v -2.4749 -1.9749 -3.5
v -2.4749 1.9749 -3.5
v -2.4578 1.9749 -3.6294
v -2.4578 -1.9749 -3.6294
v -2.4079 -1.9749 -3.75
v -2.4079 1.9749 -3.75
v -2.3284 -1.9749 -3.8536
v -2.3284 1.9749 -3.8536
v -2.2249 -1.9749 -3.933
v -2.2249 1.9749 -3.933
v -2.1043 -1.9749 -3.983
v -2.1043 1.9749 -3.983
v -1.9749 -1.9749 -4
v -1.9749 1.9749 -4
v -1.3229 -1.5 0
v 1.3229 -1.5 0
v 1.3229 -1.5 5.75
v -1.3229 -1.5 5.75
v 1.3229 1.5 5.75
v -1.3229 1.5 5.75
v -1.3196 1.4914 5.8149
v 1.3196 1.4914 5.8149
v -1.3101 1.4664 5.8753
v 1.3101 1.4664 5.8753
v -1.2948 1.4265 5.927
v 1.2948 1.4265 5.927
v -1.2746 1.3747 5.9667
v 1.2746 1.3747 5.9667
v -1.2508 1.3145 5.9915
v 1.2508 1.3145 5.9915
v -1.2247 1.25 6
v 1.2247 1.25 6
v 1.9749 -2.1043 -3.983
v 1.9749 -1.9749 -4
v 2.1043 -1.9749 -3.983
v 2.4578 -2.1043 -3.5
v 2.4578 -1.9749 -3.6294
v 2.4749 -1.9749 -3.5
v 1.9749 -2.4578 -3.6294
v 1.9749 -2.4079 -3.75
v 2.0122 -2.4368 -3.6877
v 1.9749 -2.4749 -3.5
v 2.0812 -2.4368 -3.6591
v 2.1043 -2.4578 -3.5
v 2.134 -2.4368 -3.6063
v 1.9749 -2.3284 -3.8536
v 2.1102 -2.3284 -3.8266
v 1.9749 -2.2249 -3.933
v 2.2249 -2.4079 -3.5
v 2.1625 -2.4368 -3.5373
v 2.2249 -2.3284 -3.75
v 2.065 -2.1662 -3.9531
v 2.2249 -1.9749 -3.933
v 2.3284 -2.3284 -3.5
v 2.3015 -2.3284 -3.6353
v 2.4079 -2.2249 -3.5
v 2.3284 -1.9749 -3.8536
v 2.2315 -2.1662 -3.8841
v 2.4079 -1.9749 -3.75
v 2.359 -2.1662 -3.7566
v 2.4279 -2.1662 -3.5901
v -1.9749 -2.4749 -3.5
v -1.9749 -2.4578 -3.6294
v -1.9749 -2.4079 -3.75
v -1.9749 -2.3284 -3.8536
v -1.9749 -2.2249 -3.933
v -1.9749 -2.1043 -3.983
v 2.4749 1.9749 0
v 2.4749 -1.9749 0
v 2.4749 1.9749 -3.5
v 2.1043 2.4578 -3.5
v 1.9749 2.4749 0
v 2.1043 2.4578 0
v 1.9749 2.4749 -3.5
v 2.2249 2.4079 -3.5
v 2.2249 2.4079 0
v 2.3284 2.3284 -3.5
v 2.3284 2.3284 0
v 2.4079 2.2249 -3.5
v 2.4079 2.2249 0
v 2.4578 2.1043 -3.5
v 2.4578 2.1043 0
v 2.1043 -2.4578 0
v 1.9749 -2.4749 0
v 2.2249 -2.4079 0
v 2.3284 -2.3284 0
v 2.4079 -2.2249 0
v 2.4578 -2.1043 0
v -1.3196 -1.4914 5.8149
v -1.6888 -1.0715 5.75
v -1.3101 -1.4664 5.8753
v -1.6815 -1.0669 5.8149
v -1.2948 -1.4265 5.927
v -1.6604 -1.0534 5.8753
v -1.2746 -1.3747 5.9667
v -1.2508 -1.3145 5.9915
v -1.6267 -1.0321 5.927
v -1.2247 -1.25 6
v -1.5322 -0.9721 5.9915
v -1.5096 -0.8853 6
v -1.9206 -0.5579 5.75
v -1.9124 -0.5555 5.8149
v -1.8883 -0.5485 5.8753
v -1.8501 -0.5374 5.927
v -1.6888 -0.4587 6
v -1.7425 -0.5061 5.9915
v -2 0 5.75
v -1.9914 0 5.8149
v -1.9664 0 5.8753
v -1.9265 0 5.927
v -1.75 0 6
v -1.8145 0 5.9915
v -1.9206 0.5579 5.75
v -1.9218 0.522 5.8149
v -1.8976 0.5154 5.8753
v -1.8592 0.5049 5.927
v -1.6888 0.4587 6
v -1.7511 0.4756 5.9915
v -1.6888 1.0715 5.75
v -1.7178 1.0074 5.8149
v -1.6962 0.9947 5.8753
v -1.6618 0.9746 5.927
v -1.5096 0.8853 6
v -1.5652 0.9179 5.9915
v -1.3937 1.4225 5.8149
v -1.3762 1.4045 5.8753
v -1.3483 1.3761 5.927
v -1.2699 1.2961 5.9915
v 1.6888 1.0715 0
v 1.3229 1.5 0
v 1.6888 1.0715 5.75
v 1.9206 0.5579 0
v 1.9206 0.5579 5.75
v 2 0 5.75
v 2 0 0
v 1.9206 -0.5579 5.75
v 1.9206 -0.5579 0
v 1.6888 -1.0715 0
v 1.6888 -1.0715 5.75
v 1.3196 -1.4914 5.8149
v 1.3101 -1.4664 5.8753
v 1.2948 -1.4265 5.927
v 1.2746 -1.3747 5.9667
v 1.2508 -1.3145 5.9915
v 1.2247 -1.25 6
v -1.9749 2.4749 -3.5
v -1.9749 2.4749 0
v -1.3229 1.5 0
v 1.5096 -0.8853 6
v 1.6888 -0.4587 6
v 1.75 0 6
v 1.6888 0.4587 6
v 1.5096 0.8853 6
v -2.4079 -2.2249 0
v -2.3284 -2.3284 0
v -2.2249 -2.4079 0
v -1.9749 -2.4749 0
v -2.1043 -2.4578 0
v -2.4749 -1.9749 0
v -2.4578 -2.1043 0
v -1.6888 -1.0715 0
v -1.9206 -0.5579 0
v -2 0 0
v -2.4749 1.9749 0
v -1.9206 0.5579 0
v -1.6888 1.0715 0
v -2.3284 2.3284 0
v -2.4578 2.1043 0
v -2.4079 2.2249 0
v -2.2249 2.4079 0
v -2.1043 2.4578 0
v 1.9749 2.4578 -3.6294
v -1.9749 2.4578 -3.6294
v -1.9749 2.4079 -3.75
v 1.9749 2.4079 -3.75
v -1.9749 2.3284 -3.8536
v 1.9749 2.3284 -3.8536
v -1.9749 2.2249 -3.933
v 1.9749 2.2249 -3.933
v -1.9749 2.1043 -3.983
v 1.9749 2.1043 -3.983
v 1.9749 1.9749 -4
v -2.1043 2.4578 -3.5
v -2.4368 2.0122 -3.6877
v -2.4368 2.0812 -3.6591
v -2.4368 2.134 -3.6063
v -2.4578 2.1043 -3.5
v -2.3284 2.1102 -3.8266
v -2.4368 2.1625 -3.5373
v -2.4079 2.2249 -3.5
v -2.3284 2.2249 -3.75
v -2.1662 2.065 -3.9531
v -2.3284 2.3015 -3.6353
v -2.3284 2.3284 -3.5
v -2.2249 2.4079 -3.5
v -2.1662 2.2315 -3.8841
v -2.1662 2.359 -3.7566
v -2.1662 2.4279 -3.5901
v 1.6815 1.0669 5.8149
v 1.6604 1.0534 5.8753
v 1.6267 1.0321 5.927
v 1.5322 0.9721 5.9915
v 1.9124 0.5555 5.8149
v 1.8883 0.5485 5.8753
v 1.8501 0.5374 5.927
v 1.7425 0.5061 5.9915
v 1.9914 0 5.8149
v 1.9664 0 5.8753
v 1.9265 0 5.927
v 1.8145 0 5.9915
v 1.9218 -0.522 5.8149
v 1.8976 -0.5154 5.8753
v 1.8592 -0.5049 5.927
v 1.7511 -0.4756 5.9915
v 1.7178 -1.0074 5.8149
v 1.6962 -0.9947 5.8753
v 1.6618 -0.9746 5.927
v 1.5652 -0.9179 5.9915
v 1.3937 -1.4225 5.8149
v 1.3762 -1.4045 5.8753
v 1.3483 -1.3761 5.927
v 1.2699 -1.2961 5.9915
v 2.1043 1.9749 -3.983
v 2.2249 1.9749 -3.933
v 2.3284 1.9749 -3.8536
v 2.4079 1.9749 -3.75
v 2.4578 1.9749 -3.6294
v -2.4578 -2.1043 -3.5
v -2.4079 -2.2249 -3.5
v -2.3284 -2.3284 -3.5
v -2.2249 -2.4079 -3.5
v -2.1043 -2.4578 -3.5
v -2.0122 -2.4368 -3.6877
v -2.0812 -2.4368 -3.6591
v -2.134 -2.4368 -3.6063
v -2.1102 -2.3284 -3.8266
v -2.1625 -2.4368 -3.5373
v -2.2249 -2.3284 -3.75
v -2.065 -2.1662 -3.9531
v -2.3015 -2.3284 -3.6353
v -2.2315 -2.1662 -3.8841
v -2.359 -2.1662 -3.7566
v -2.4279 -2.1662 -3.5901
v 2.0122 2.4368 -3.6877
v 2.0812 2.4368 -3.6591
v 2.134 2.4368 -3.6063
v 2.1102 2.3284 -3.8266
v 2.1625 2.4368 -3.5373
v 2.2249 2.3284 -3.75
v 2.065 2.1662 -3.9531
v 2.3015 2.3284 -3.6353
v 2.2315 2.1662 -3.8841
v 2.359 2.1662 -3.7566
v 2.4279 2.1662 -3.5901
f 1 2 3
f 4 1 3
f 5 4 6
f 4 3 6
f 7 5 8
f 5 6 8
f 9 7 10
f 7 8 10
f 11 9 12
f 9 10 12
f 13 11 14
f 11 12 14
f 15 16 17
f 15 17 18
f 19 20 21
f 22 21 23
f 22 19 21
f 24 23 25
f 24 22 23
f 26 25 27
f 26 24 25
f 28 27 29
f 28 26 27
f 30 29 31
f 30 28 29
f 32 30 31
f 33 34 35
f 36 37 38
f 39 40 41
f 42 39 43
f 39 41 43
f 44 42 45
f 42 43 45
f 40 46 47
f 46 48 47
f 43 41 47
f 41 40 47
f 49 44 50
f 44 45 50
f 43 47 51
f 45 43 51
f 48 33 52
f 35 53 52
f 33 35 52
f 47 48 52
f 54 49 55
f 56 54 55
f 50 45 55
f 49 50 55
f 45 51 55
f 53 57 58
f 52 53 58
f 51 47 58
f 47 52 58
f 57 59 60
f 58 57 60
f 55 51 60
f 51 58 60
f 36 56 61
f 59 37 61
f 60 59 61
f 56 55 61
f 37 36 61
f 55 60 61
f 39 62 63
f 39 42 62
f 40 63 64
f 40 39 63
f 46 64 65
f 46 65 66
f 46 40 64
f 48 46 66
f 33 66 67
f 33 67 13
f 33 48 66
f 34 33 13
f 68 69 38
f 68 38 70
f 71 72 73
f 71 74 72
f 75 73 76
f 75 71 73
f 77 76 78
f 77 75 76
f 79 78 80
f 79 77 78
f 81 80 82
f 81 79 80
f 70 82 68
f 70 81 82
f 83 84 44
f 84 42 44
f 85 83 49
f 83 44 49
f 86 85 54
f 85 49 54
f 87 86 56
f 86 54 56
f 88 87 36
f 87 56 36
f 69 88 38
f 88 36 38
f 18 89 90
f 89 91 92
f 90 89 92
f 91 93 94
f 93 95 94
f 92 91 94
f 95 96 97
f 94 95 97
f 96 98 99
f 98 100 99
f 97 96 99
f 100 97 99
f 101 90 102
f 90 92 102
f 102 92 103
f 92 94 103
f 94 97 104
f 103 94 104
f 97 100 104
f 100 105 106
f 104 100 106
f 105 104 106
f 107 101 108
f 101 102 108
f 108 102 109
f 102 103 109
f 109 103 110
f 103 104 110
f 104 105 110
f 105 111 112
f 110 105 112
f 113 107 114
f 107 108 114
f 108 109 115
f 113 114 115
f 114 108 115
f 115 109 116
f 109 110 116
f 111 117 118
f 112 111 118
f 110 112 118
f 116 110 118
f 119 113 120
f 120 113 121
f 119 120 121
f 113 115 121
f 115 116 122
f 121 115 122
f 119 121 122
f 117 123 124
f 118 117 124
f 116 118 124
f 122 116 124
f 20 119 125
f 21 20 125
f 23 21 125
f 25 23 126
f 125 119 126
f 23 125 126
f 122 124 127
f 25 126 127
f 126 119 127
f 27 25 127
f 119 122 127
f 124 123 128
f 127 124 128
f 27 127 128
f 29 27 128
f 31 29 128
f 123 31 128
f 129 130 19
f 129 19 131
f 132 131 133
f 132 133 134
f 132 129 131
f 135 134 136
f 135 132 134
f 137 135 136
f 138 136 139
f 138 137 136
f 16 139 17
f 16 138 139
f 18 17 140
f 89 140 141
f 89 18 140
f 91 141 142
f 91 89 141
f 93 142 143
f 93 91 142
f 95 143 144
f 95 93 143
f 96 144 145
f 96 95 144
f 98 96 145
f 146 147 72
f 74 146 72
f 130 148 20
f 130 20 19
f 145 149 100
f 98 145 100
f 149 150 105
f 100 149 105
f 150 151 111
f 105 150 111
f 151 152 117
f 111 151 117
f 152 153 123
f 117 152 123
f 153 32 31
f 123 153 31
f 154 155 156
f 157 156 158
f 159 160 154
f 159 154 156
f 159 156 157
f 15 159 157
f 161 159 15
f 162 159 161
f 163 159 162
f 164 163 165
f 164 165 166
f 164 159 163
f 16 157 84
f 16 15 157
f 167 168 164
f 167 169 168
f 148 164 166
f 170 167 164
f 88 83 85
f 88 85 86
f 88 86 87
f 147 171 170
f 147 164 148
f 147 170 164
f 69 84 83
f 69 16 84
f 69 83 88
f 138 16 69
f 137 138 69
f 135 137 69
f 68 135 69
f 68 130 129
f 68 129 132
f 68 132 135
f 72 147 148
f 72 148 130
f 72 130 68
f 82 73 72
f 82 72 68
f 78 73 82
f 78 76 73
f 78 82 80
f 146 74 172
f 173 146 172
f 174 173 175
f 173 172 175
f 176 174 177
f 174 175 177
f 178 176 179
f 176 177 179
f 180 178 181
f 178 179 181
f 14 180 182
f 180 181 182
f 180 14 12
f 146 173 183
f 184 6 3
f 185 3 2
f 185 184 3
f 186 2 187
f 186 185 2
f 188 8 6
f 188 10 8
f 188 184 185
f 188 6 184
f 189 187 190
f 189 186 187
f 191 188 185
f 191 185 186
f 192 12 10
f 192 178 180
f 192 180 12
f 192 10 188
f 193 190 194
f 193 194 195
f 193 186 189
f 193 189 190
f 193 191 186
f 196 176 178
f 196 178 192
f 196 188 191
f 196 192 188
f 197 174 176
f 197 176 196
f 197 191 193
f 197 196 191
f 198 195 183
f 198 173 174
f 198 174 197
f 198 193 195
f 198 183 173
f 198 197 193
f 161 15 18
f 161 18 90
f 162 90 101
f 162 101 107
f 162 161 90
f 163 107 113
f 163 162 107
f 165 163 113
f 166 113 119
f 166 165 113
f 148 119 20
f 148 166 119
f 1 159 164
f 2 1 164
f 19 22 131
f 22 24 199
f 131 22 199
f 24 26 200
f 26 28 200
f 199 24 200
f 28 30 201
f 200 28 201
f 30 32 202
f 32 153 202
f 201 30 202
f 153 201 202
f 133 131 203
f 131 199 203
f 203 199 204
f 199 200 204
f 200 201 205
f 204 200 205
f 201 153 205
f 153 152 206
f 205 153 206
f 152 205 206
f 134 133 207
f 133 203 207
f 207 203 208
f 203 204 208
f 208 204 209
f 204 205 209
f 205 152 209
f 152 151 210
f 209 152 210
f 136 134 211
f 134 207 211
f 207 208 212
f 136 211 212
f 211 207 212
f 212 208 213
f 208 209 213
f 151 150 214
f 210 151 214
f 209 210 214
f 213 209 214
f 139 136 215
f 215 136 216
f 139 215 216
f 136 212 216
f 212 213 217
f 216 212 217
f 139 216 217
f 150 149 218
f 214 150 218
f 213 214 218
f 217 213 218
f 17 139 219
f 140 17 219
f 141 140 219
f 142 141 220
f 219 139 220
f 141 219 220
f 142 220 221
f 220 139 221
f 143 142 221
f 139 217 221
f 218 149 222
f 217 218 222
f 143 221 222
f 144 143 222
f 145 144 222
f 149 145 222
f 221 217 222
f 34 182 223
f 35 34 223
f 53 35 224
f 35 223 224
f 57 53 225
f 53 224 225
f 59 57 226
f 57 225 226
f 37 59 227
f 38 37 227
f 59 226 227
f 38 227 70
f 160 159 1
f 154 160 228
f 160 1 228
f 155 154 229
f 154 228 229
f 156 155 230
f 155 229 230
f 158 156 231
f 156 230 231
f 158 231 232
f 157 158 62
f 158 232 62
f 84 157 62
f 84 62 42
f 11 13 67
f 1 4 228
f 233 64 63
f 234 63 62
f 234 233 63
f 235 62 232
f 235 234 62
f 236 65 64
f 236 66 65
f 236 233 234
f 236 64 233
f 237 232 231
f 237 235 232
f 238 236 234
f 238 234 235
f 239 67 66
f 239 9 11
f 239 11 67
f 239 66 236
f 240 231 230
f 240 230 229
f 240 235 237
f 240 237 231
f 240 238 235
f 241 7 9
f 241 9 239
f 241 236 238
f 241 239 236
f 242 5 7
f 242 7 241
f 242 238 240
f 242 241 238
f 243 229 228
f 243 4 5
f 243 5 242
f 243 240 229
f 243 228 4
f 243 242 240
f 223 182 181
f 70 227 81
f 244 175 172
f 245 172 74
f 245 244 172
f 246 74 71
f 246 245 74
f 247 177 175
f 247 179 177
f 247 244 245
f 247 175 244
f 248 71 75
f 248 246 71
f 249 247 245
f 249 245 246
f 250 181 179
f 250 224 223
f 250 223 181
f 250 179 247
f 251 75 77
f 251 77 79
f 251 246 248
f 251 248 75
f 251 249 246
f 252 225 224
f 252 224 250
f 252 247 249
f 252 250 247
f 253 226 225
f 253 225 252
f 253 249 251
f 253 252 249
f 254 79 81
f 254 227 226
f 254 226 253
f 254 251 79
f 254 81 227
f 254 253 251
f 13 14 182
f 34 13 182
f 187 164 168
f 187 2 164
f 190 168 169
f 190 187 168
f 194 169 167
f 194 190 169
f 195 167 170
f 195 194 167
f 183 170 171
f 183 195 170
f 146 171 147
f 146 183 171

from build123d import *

# Parameters (mm, degrees)
ESQUISSE1_W      = 4.949747468
ESQUISSE1_H      = 4.949747468
EXTRUSION1_DEPTH = 4
EXTRUSION5_DEPTH = 6
CONG_1_R         = 0.5
CONG_2_R         = 0.25


with BuildPart() as part:
    # Esquisse1 → Extrusion1 (new body)
    with BuildSketch(Plane.XY):
        Rectangle(ESQUISSE1_W, ESQUISSE1_H)
    extrude(amount=-EXTRUSION1_DEPTH)

    # Esquisse3 → Extrusion5 (add)
    with BuildSketch(Plane.XY):
        with BuildLine():
            Line((-1.322875656, 1.5), (1.322875656, 1.5))
            ThreePointArc((1.322875656, 1.5), (2, 0), (1.322875656, -1.5))
            Line((1.322875656, -1.5), (-1.322875656, -1.5))
            ThreePointArc((-1.322875656, -1.5), (-2, 0), (-1.322875656, 1.5))
        make_face()
    extrude(amount=EXTRUSION5_DEPTH)

    # Congé1
    cong_1_edges = [part.edges().sort_by_distance(p)[0] for p in [
        (2.474873734, 0, -4),
        (0, 2.474873734, -4),
        (-2.474873734, 0, -4),
        (0, -2.474873734, -4),
        (-2.474873734, 2.474873734, -2),
        (2.474873734, 2.474873734, -2),
        (2.474873734, -2.474873734, -2),
        (-2.474873734, -2.474873734, -2),
    ]]
    fillet(cong_1_edges, radius=CONG_1_R)

    # Congé2
    cong_2_edges = [part.edges().sort_by_distance(p)[0] for p in [
        (-2, 0, 6),
        (0, -1.5, 6),
        (2, 0, 6),
        (0, 1.5, 6),
    ]]
    fillet(cong_2_edges, radius=CONG_2_R)


solid = part.part
